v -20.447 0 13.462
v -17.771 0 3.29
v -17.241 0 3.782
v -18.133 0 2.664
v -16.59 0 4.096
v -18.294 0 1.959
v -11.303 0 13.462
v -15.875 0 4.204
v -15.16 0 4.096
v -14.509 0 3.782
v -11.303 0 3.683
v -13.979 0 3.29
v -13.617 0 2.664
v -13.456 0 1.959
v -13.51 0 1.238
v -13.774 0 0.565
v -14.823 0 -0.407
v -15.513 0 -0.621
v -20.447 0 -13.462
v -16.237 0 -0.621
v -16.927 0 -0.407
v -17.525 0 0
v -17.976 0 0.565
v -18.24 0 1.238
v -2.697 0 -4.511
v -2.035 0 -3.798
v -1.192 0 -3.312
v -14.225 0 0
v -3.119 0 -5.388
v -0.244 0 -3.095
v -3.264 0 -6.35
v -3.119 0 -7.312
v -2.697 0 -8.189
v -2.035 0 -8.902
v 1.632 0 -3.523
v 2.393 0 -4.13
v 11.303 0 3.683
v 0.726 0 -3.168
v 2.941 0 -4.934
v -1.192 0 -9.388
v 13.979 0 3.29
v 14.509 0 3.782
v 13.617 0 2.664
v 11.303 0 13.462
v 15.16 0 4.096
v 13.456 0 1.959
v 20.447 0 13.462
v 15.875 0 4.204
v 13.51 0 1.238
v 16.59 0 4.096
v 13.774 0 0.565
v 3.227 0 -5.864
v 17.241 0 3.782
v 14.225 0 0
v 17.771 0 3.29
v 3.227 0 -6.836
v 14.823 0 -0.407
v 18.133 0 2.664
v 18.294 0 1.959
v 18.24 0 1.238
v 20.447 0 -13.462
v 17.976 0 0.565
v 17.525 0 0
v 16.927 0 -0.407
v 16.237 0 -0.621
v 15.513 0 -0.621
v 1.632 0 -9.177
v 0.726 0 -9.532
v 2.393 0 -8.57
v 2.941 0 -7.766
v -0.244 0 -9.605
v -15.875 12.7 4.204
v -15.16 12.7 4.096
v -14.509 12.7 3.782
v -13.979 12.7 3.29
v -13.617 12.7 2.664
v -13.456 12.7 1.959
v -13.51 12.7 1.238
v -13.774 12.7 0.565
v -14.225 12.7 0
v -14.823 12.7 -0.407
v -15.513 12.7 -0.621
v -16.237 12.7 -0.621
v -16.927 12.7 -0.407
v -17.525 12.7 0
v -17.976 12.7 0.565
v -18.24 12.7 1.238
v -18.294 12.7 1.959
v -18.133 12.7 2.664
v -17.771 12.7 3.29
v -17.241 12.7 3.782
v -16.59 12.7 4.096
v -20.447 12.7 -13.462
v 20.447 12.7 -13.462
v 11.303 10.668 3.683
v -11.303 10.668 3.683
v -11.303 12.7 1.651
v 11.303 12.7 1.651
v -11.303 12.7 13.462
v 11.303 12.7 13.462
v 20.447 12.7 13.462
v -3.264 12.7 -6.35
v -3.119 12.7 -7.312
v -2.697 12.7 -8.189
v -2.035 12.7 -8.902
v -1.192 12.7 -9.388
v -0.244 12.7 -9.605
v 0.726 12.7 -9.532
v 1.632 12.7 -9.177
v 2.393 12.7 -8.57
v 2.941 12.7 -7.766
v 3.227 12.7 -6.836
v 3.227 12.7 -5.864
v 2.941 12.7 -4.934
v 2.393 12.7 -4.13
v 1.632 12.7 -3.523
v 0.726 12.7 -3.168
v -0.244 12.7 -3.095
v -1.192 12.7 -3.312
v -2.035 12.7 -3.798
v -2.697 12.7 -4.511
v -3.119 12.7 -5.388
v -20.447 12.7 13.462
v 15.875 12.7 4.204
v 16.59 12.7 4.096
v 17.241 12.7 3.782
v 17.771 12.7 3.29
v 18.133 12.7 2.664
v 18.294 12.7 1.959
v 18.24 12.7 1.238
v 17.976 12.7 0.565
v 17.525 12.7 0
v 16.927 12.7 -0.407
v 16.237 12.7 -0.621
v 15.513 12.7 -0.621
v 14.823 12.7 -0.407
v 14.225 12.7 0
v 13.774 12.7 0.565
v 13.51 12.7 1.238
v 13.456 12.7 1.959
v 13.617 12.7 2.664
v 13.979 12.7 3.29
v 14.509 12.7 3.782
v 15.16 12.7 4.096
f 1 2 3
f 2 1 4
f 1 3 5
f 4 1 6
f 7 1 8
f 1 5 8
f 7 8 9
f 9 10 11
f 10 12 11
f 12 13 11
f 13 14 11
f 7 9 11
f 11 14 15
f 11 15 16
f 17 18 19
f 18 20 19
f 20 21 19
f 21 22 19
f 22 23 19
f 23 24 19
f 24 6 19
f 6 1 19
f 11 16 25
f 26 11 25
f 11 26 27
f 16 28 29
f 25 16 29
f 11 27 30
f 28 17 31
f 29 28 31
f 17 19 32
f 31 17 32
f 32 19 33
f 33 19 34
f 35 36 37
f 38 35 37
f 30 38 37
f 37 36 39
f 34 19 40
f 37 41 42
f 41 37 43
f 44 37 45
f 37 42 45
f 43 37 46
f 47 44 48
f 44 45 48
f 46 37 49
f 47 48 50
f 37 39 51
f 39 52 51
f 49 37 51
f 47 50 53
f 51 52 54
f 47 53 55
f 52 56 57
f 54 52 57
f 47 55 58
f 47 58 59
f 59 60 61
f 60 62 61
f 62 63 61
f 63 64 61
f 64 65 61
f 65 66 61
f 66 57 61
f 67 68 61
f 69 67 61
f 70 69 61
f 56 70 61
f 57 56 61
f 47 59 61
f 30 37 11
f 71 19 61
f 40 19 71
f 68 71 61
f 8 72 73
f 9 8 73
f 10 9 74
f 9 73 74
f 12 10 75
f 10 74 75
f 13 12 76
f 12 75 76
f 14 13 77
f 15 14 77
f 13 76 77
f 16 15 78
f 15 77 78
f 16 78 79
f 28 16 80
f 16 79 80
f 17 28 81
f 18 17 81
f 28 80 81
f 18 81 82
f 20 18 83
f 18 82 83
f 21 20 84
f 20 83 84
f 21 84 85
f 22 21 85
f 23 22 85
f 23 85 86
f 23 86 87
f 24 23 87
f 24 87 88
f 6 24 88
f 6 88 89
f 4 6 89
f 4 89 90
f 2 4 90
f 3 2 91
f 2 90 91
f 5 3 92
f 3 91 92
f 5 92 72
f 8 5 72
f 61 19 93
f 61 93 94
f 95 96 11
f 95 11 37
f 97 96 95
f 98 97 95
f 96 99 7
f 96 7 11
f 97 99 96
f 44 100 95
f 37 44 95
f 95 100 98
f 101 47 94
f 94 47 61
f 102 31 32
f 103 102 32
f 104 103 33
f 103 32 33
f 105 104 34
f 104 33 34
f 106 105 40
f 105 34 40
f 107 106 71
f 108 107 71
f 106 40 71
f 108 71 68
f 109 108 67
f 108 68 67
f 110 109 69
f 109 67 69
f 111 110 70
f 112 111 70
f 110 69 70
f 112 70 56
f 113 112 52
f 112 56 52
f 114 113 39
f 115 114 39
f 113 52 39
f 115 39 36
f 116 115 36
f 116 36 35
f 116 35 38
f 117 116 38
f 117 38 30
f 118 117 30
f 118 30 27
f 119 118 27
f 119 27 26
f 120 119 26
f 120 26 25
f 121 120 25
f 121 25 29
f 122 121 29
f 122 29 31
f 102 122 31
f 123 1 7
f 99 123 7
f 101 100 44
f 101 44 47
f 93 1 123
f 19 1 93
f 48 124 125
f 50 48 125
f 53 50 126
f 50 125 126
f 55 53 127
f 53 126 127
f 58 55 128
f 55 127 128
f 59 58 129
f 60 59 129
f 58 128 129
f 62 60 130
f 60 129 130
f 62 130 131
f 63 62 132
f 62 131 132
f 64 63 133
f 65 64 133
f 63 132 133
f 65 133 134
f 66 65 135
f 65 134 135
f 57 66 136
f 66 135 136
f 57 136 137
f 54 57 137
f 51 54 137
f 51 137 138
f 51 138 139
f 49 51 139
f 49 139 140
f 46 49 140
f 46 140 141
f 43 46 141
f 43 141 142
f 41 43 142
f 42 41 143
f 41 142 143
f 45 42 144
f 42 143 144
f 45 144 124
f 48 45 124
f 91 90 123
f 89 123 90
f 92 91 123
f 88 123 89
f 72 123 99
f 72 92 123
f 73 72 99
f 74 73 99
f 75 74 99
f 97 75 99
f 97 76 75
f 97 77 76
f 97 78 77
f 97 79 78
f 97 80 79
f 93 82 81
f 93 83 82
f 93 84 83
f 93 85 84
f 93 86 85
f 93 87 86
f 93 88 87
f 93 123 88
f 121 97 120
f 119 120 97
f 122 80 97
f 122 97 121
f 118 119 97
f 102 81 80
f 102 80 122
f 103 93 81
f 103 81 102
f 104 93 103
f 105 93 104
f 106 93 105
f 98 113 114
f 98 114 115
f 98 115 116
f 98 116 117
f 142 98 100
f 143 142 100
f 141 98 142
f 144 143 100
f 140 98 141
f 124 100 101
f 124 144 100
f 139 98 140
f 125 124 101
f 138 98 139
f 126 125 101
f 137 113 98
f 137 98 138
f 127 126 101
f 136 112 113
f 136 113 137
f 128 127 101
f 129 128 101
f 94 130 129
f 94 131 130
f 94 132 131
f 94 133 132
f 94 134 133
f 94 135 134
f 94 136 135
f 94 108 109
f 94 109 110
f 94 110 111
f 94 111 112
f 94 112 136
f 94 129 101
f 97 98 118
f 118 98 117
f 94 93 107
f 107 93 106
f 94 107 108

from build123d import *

# Parameters (mm, degrees)
CROQUIS2_W                 = 40.894
CROQUIS2_H                 = 26.924
SALIENTE_EXTRUIR1_DEPTH    = 12.7
CROQUIS3_W                 = 22.606
CROQUIS3_H                 = 9.779
CORTAR_EXTRUIR1_DEPTH      = 12.7
CROQUIS6_R                 = 2.4257
CORTAR_EXTRUIR2_DEPTH      = 12.7
TALADRO_ROSCADO_5_16_181_D = 6.5278
CHAFL_N1_SIZE              = 2.032


with BuildPart() as part:
    # Croquis2 → Saliente-Extruir1 (new body)
    with BuildSketch(Plane(origin=(0, 0, 0), x_dir=(1, 0, 0), z_dir=(0, 1, 0))):
        Rectangle(CROQUIS2_W, CROQUIS2_H)
    extrude(amount=SALIENTE_EXTRUIR1_DEPTH)

    # Croquis3 → Cortar-Extruir1 (cut)
    with BuildSketch(Plane(origin=(0, 12.7, 0), x_dir=(1, 0, 0), z_dir=(0, 1, 0))):
        with Locations((0, -8.5725)):
            Rectangle(CROQUIS3_W, CROQUIS3_H)
    extrude(amount=-CORTAR_EXTRUIR1_DEPTH, mode=Mode.SUBTRACT)

    # Croquis6 → Cortar-Extruir2 (cut)
    with BuildSketch(Plane(origin=(0, 12.7, 0), x_dir=(1, 0, 0), z_dir=(0, 1, 0))):
        with Locations(Location((-15.875, -1.778, 0), (0, 0, 270))):
            Circle(CROQUIS6_R)
        with Locations(Location((15.875, -1.778, 0), (0, 0, 270))):
            Circle(CROQUIS6_R)
    extrude(amount=-CORTAR_EXTRUIR2_DEPTH, mode=Mode.SUBTRACT)

    # Taladro roscado 5/16-181 (through all)
    with Locations(Plane(origin=(0, 12.7, 0), x_dir=(1, 0, 0), z_dir=(0, 1, 0))):
        with Locations((0, 6.35)):
            Hole(TALADRO_ROSCADO_5_16_181_D / 2)

    # Chaflán1
    chafl_n1_edges = [part.edges().sort_by_distance(p)[0] for p in [
        (0, 12.7, 3.683),
    ]]
    chamfer(chafl_n1_edges, length=CHAFL_N1_SIZE)


solid = part.part
